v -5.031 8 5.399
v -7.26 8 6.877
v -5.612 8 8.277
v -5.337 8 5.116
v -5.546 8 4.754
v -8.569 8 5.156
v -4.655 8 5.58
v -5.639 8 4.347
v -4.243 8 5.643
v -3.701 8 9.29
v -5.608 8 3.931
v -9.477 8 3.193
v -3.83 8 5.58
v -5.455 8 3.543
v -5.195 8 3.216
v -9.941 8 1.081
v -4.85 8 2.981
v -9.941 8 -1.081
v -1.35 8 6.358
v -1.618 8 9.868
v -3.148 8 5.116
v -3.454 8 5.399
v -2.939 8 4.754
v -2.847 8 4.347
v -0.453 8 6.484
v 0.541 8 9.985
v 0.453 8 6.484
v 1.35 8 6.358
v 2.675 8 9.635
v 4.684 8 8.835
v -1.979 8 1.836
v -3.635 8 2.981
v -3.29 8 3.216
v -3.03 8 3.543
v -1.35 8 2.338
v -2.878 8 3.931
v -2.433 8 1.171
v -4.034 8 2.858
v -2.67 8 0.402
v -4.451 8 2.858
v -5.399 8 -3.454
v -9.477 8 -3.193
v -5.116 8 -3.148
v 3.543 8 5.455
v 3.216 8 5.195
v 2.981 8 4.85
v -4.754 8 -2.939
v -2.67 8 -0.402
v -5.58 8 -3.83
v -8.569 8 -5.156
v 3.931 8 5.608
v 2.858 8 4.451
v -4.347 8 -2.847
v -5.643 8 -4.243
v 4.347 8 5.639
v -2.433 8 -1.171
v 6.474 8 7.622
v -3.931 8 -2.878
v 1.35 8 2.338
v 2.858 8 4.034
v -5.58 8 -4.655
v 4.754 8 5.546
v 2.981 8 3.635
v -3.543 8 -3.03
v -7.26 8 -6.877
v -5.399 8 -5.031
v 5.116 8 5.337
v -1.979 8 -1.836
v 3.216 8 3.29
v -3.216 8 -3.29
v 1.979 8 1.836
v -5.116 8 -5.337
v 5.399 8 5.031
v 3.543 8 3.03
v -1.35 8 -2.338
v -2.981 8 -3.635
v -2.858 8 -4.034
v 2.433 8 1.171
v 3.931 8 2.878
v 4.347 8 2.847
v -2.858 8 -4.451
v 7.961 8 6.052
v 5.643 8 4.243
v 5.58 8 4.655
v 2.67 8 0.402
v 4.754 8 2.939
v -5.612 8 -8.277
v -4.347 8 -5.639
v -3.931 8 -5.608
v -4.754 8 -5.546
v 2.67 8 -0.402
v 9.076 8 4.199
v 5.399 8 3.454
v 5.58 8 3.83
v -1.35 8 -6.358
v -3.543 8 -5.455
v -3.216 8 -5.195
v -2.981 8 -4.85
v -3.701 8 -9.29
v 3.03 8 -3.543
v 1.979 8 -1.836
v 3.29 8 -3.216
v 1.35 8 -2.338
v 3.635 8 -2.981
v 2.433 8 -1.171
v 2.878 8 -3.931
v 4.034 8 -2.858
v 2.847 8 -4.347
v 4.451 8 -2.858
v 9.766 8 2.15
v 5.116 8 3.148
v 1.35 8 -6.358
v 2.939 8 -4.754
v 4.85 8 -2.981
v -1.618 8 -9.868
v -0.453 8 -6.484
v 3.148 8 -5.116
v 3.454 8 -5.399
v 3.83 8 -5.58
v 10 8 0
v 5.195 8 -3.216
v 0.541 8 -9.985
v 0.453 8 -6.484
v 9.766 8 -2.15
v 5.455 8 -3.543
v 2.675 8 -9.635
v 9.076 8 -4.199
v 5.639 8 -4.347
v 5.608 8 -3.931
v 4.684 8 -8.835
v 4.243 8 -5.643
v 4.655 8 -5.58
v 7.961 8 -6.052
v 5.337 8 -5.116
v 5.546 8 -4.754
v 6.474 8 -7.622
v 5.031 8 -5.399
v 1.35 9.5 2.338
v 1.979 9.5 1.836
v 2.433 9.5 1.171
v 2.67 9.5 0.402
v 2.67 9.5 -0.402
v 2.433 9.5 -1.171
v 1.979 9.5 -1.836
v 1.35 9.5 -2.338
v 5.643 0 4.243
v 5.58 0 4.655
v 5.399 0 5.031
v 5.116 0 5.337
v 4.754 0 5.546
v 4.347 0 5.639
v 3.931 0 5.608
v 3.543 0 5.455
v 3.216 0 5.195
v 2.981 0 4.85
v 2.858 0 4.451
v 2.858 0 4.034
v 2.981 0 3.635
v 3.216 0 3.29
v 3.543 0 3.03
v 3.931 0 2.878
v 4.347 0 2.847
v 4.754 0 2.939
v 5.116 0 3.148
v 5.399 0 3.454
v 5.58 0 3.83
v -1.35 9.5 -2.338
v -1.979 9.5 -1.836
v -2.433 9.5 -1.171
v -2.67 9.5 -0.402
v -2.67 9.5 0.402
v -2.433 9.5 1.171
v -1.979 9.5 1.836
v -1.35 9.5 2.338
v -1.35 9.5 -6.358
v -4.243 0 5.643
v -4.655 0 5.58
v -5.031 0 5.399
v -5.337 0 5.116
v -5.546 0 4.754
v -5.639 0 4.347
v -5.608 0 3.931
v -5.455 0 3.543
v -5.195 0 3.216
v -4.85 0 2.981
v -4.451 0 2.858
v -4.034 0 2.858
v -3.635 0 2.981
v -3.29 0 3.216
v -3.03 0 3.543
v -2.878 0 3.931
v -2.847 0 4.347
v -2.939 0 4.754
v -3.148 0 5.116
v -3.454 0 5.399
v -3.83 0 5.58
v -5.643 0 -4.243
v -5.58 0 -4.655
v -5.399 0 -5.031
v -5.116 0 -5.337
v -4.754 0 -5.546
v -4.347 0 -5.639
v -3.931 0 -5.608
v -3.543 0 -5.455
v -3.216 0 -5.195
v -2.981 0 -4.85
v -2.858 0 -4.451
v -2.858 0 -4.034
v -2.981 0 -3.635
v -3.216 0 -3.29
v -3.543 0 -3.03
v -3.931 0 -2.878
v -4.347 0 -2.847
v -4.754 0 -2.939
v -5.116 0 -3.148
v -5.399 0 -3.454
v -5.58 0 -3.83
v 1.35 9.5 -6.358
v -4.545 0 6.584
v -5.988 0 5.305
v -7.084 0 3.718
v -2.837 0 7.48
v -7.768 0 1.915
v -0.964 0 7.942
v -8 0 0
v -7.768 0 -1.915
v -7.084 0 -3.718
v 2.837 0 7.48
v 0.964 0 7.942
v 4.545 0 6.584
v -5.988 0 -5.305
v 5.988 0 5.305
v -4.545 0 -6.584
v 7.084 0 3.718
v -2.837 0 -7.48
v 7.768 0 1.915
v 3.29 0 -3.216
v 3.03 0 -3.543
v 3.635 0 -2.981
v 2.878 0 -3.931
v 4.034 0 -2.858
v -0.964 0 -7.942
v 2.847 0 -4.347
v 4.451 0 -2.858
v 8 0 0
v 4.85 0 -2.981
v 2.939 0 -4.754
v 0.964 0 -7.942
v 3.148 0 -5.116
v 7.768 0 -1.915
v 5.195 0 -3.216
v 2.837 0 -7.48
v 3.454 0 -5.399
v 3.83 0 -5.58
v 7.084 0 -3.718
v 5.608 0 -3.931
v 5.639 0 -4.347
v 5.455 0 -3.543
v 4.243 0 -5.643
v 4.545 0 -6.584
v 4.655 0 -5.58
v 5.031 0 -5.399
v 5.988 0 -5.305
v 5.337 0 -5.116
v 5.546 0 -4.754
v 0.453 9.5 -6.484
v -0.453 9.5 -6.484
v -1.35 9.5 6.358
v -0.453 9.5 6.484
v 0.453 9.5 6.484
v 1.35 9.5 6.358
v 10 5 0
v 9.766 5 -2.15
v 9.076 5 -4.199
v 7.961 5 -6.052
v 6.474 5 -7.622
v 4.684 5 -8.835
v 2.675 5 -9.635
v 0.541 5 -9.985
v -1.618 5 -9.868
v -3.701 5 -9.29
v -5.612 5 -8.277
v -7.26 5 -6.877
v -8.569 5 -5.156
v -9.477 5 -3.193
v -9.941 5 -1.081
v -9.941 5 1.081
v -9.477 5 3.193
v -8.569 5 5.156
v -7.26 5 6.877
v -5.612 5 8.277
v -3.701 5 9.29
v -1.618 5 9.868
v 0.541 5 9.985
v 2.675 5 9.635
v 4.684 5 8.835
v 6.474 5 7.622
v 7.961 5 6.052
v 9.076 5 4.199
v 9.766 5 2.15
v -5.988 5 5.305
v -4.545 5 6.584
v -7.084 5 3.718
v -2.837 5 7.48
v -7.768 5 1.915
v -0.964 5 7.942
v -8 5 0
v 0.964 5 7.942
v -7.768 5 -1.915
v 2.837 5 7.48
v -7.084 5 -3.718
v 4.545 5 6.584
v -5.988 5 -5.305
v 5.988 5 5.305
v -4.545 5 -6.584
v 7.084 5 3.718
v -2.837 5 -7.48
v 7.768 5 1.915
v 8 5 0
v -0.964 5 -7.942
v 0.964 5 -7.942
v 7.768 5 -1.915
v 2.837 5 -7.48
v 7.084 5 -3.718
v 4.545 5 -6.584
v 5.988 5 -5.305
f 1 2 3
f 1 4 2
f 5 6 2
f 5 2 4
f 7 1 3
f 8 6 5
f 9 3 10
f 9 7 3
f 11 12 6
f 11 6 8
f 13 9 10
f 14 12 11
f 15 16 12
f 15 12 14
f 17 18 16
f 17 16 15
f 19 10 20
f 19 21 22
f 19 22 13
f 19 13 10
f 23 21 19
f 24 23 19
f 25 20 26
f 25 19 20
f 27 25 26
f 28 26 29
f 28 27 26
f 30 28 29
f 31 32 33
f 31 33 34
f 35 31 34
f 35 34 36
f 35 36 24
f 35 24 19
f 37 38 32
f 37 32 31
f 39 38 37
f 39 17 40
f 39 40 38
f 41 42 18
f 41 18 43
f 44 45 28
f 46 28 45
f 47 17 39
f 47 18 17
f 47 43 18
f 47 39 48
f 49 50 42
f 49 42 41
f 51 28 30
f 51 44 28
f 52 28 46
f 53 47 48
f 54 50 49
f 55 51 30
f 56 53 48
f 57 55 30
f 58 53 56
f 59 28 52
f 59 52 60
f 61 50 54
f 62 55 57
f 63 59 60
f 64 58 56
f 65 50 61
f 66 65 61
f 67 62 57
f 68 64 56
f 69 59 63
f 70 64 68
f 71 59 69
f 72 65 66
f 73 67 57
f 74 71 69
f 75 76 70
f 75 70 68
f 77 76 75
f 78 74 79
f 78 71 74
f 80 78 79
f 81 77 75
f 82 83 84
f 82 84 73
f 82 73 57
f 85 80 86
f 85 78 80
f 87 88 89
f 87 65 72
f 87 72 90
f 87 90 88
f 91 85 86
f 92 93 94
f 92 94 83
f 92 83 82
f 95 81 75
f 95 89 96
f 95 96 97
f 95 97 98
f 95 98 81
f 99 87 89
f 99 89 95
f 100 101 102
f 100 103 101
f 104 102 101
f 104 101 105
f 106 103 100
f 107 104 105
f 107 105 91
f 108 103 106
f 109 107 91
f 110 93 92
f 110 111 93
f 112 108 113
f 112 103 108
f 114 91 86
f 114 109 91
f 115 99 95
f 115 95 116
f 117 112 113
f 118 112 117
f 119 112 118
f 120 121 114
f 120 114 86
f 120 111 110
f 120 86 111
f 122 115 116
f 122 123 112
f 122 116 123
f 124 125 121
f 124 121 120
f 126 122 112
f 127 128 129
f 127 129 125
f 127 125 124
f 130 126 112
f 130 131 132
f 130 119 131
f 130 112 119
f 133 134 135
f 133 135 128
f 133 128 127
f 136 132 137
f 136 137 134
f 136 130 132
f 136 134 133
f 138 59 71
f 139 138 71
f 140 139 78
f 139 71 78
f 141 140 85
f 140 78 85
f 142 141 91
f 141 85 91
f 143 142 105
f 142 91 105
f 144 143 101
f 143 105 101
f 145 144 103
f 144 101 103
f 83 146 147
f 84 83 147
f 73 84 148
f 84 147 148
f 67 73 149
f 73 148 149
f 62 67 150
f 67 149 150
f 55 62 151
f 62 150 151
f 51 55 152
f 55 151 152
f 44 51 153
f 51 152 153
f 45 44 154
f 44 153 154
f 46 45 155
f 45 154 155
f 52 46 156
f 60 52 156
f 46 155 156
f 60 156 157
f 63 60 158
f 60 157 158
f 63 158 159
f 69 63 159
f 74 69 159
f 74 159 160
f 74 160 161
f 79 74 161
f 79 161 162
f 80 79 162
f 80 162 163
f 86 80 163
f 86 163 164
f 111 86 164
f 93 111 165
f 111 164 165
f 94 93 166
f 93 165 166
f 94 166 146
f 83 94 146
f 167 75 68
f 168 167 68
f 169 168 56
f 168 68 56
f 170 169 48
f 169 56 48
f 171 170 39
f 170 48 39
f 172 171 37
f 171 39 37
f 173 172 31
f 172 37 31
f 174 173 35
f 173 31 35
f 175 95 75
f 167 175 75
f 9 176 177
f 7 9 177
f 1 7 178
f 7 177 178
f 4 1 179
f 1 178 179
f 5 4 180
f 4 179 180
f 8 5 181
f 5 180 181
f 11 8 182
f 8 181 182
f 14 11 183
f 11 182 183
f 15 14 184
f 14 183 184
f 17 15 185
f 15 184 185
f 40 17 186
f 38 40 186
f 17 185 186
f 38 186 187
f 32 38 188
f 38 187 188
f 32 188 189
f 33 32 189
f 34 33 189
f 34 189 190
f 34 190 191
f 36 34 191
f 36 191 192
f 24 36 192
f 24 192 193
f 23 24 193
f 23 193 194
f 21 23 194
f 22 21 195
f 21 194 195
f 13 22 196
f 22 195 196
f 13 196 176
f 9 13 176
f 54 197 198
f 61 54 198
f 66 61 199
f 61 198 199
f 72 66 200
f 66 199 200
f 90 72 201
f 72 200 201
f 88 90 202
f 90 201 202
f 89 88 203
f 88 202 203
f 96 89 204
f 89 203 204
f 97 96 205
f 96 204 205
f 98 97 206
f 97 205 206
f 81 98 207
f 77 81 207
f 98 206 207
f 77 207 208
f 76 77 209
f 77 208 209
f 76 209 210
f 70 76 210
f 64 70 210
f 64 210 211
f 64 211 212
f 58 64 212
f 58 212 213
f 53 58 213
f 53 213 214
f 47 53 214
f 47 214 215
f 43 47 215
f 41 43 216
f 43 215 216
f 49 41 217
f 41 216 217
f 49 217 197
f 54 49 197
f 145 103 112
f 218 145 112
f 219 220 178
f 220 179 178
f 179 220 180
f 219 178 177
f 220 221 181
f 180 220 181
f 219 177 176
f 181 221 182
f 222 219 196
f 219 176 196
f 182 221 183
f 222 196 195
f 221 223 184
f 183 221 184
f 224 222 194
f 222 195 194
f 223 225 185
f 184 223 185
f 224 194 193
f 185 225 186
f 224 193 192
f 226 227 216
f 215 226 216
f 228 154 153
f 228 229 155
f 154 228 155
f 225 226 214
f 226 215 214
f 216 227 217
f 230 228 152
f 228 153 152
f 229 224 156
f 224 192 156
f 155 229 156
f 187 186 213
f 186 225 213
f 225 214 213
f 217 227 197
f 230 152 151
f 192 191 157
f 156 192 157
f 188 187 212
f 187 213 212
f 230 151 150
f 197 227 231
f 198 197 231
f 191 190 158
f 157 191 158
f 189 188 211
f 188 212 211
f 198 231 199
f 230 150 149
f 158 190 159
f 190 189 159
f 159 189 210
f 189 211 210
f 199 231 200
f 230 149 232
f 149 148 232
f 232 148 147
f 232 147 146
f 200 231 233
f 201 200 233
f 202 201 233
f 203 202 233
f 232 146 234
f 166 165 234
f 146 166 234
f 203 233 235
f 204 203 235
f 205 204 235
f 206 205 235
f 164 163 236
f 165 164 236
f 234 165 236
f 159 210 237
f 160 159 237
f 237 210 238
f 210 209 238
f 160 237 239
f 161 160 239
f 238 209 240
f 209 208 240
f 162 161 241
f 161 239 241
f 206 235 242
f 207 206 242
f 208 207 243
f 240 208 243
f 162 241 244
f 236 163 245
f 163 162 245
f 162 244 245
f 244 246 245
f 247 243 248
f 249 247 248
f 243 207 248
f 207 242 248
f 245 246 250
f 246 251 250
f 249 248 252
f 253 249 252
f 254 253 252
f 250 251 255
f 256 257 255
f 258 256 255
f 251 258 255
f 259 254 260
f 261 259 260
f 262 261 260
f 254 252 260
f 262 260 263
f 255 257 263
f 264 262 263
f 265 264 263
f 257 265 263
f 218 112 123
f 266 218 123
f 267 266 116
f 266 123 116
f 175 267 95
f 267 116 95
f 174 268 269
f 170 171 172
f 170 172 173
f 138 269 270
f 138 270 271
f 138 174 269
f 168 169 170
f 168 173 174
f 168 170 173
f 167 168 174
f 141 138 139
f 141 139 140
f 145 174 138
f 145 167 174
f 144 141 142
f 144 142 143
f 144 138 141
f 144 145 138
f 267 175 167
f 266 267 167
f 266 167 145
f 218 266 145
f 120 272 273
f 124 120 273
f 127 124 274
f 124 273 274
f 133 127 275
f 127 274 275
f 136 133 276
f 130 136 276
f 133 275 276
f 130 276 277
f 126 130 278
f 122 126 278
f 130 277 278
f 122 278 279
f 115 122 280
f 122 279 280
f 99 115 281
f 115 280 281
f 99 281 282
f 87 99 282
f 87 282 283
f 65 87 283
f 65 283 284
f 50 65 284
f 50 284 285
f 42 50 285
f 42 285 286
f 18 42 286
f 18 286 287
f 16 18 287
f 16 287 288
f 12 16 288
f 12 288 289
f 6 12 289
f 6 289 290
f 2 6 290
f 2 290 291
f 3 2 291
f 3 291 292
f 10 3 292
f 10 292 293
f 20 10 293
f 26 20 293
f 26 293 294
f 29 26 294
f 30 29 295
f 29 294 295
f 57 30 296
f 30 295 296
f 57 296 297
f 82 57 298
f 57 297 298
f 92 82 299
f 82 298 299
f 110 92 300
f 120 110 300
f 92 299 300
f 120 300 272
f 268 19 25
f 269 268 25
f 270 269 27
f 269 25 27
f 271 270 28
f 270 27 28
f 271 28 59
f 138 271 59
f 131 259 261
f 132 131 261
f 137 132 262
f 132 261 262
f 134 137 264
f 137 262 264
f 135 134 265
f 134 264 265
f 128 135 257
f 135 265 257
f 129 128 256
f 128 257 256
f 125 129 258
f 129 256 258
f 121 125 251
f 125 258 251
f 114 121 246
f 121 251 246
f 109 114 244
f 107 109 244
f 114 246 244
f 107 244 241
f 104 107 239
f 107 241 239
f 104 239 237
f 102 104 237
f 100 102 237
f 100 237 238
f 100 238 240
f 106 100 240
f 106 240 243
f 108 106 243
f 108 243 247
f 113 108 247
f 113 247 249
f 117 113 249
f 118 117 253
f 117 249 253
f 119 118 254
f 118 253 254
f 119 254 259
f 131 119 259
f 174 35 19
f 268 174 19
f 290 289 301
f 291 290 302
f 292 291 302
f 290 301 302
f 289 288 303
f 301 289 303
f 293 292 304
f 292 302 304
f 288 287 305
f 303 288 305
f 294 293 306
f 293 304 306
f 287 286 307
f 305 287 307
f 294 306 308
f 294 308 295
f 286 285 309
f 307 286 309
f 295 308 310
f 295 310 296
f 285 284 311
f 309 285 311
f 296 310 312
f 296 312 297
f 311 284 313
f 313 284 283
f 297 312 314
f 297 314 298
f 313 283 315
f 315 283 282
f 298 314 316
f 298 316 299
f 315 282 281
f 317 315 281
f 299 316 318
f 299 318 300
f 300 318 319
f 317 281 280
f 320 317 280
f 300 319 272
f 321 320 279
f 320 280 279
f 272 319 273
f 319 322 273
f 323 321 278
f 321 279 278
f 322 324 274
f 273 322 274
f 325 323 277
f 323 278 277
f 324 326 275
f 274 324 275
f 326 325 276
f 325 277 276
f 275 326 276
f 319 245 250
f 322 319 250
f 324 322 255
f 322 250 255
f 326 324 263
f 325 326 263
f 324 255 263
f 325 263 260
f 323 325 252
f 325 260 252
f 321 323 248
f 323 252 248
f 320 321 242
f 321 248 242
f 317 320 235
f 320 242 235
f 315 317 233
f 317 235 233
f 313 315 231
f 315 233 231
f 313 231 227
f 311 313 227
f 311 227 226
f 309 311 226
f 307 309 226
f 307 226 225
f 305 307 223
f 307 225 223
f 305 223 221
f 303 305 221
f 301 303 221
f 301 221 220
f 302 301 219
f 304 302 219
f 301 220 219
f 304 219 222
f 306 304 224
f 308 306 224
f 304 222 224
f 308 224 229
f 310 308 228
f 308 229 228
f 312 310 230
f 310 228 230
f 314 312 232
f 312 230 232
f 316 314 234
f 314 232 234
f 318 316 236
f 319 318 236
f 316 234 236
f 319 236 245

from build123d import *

# Parameters (mm, degrees)
SKETCH1_R           = 10
BOSS_EXTRUDE1_DEPTH = 8
BOSS_EXTRUDE2_DEPTH = 1.5
SKETCH5_R           = 10
SKETCH5_R_2         = 8
CUT_EXTRUDE1_DEPTH  = 5
SKETCH6_R           = 1.4
CUT_EXTRUDE2_DEPTH  = 8
CIRPATTERN1_COUNT   = 4


with BuildPart() as part:
    # Sketch1 → Boss-Extrude1 (new body)
    with BuildSketch(Plane(origin=(0, 0, 0), x_dir=(1, 0, 0), z_dir=(0, 1, 0))):
        Circle(SKETCH1_R)
    extrude(amount=BOSS_EXTRUDE1_DEPTH)

    # Sketch4 → Boss-Extrude2 (add)
    with BuildSketch(Plane(origin=(0, 8, 0), x_dir=(1, 0, 0), z_dir=(0, 1, 0))):
        with BuildLine():
            Line((-1.35, 6.358262341), (-1.35, 2.33826859))
            ThreePointArc((-1.35, 2.33826859), (-2.7, 0), (-1.35, -2.33826859))
            Line((-1.35, -2.33826859), (-1.35, -6.358262341))
            ThreePointArc((-1.35, -6.358262341), (0, -6.5), (1.35, -6.358262341))
            Line((1.35, -6.358262341), (1.35, -2.33826859))
            ThreePointArc((1.35, -2.33826859), (2.7, 0), (1.35, 2.33826859))
            Line((1.35, 2.33826859), (1.35, 6.358262341))
            ThreePointArc((1.35, 6.358262341), (0, 6.5), (-1.35, 6.358262341))
        make_face()
    extrude(amount=BOSS_EXTRUDE2_DEPTH)

    # Sketch5 → Cut-Extrude1 (cut)
    with BuildSketch(Plane(origin=(0, 0, 0), x_dir=(1, 0, 0), z_dir=(0, 1, 0))):
        Circle(SKETCH5_R)
        Circle(SKETCH5_R_2, mode=Mode.SUBTRACT)
    extrude(amount=CUT_EXTRUDE1_DEPTH, mode=Mode.SUBTRACT)

    # Sketch6 → Cut-Extrude2 (cut)
    with BuildSketch(Plane.XZ):
        with Locations((4.242640687, 4.242640687)):
            Circle(SKETCH6_R)
    cut_extrude2 = extrude(amount=-CUT_EXTRUDE2_DEPTH, mode=Mode.SUBTRACT)

    # CirPattern1: Cut-Extrude2 ×4 about axis
    cirpattern1_axis = Axis((0, 0, 0), (0, 1, 0))
    for i in range(1, CIRPATTERN1_COUNT):
        add(cut_extrude2.rotate(cirpattern1_axis, i * 360 / CIRPATTERN1_COUNT), mode=Mode.SUBTRACT)


solid = part.part
